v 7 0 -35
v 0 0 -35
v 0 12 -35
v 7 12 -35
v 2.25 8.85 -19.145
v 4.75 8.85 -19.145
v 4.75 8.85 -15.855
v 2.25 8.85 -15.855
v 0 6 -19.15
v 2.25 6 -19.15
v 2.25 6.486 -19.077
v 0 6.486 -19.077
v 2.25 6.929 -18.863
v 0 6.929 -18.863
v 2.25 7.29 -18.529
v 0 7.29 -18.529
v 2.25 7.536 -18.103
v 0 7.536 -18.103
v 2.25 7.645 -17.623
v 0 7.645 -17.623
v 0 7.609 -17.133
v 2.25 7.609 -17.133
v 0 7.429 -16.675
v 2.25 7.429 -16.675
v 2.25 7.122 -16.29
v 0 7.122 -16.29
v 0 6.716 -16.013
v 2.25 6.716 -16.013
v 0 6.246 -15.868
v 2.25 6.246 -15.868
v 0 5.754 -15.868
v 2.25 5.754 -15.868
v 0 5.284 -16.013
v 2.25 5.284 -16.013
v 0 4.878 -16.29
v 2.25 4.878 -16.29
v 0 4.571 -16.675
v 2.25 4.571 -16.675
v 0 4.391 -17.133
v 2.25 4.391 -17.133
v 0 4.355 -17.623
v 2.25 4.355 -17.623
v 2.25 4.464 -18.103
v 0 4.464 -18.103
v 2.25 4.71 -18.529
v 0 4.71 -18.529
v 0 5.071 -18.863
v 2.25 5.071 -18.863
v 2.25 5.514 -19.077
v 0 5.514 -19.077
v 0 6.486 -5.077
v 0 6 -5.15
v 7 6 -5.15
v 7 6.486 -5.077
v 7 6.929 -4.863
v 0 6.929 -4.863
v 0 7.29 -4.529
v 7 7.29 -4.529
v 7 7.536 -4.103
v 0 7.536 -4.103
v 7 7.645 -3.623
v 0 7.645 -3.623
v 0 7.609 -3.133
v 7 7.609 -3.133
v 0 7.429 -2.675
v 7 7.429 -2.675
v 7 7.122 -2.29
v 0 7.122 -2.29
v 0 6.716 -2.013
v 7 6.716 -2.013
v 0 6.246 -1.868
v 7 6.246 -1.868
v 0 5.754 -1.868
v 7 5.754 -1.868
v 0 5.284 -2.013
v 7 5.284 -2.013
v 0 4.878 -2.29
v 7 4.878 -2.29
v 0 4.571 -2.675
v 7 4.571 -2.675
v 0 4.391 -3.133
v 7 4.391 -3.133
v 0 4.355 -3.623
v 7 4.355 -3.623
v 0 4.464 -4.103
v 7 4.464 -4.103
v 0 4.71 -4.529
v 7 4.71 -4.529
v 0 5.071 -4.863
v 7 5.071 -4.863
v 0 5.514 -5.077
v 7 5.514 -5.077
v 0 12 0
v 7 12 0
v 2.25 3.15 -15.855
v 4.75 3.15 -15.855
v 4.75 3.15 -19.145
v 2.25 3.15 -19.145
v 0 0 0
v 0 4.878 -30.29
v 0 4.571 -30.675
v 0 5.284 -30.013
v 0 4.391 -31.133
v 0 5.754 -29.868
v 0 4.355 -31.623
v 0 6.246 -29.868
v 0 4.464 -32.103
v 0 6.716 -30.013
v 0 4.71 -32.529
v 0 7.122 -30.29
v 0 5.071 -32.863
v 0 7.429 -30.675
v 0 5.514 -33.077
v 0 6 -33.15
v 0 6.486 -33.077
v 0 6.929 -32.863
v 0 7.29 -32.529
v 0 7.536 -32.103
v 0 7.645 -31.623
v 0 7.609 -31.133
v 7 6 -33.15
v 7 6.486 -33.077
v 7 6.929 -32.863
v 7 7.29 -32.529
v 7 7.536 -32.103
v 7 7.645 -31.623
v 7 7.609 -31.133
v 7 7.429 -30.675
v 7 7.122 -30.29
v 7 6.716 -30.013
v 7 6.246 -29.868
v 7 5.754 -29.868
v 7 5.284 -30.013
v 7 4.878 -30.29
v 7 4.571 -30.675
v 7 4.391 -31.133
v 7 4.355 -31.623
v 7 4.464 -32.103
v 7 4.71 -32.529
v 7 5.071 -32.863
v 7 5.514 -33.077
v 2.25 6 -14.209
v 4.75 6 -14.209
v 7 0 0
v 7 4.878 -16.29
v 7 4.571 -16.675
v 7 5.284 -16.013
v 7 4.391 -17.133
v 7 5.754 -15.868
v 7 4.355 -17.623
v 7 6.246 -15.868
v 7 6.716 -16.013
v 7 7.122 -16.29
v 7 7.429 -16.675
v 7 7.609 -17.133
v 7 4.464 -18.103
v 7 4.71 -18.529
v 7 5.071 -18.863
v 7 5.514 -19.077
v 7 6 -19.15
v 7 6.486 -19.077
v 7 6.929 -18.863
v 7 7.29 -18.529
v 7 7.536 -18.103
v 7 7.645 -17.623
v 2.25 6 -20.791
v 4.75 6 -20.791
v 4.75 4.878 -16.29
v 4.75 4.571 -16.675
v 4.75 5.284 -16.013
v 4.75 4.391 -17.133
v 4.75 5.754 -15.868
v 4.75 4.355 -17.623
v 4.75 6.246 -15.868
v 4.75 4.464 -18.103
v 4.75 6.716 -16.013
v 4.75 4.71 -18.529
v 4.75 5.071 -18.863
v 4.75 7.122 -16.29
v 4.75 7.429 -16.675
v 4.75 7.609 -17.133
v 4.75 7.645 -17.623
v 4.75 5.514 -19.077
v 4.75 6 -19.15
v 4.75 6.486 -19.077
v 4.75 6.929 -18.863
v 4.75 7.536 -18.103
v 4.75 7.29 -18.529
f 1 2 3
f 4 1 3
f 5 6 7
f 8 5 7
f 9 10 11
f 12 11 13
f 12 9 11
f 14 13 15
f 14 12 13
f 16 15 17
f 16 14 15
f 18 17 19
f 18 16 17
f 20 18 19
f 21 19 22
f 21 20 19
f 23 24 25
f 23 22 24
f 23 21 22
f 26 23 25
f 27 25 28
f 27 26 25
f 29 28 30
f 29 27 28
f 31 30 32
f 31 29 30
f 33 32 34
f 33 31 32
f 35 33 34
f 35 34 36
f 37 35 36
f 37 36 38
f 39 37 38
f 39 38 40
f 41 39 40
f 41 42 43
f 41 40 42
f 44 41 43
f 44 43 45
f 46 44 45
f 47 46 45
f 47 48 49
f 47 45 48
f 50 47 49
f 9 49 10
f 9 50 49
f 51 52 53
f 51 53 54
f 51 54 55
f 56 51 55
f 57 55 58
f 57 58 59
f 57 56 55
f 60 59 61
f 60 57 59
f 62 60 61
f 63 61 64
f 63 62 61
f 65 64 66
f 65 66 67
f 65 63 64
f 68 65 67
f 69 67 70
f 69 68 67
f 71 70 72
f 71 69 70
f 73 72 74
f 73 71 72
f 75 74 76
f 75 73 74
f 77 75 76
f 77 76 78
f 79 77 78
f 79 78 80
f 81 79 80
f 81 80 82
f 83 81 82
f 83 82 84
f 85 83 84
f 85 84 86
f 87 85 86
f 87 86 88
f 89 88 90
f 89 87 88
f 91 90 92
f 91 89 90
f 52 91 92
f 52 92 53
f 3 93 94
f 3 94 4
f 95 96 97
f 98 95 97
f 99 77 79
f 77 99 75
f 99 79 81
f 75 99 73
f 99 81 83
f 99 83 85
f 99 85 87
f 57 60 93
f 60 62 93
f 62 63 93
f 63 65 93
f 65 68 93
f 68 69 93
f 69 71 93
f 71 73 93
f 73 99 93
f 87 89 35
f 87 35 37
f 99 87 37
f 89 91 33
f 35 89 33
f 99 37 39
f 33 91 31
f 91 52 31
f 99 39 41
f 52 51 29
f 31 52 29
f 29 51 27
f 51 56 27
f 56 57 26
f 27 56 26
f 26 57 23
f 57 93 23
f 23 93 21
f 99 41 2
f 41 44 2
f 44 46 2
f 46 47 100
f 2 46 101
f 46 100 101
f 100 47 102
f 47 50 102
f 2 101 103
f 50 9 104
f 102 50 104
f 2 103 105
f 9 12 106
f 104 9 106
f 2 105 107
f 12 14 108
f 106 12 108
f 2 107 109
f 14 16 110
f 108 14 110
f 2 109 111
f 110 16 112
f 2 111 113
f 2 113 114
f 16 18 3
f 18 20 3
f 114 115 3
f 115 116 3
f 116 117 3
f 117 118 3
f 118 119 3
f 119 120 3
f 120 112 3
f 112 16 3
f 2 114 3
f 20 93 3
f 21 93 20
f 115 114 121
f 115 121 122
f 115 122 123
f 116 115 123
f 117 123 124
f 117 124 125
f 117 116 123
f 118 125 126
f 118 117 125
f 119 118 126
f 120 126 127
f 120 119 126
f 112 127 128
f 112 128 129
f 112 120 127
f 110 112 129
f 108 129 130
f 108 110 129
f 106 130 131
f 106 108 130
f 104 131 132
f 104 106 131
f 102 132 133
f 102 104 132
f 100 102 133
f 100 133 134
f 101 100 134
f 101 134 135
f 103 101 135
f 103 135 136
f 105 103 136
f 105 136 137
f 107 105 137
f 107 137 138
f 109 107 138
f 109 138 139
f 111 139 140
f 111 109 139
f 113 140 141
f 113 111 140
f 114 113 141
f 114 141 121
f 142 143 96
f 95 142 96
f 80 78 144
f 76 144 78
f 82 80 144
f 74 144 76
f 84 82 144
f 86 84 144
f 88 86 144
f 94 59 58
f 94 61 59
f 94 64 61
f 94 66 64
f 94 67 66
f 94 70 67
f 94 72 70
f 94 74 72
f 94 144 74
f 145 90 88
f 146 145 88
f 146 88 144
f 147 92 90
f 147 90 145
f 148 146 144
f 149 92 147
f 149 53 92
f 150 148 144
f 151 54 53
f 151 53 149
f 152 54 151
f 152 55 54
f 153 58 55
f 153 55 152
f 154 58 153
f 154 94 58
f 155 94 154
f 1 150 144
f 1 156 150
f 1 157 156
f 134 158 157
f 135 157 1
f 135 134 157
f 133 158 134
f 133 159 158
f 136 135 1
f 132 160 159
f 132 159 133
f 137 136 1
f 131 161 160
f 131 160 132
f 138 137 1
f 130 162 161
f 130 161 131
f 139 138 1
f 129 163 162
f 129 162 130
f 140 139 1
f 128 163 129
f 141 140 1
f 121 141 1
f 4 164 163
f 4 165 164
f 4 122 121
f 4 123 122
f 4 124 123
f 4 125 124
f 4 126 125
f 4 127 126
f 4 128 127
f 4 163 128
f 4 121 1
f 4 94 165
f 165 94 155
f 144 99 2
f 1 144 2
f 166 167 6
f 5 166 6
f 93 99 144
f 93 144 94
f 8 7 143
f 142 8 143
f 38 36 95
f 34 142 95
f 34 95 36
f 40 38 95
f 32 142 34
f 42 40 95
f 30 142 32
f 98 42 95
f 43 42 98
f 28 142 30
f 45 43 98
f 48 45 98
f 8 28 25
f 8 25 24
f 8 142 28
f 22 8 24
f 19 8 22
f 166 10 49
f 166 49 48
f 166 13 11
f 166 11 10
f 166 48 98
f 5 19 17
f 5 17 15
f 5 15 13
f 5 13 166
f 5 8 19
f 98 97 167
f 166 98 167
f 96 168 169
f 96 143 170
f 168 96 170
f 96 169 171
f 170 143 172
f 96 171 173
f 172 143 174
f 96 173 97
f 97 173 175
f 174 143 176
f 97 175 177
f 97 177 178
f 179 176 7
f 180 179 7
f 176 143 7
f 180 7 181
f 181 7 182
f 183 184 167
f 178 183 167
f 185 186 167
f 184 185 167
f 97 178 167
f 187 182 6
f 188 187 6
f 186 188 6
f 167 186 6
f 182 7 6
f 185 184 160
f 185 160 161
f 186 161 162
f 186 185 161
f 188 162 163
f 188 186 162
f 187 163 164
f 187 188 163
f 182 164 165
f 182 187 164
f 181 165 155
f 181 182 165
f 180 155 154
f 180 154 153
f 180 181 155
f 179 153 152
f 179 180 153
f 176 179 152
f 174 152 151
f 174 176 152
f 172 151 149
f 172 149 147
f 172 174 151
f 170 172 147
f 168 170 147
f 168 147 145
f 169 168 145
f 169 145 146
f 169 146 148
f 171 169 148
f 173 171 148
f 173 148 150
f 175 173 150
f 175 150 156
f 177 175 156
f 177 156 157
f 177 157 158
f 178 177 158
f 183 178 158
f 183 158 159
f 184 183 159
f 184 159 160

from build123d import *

# Parameters (mm, degrees)
SKETCH1_W           = 35
SKETCH1_H           = 12
SKETCH1_R           = 1.65
BOSS_EXTRUDE1_DEPTH = 7
CUT_EXTRUDE1_START  = -2.25
CUT_EXTRUDE1_DEPTH  = 2.5


with BuildPart() as part:
    # Sketch1 → Boss-Extrude1 (new body)
    with BuildSketch(Plane(origin=(0, 0, 0), x_dir=(0, 0, -1), z_dir=(1, 0, 0))):
        with Locations((17.5, 6)):
            Rectangle(SKETCH1_W, SKETCH1_H)
        with Locations((3.5, 6)):
            Circle(SKETCH1_R, mode=Mode.SUBTRACT)
        with Locations((31.5, 6)):
            Circle(SKETCH1_R, mode=Mode.SUBTRACT)
        with Locations((17.5, 6)):
            Circle(SKETCH1_R, mode=Mode.SUBTRACT)
    extrude(amount=BOSS_EXTRUDE1_DEPTH)

    # Sketch2 → Cut-Extrude1 (cut)
    with BuildSketch(Plane(origin=(7, 0, 0), x_dir=(0, 0, -1), z_dir=(1, 0, 0)).offset(CUT_EXTRUDE1_START)):
        Polygon((20.790896534, 6), (19.145448267, 8.85), (15.854551733, 8.85), (14.209103466, 6), (15.854551733, 3.15), (19.145448267, 3.15), align=None)
    extrude(amount=-CUT_EXTRUDE1_DEPTH, mode=Mode.SUBTRACT)


solid = part.part
